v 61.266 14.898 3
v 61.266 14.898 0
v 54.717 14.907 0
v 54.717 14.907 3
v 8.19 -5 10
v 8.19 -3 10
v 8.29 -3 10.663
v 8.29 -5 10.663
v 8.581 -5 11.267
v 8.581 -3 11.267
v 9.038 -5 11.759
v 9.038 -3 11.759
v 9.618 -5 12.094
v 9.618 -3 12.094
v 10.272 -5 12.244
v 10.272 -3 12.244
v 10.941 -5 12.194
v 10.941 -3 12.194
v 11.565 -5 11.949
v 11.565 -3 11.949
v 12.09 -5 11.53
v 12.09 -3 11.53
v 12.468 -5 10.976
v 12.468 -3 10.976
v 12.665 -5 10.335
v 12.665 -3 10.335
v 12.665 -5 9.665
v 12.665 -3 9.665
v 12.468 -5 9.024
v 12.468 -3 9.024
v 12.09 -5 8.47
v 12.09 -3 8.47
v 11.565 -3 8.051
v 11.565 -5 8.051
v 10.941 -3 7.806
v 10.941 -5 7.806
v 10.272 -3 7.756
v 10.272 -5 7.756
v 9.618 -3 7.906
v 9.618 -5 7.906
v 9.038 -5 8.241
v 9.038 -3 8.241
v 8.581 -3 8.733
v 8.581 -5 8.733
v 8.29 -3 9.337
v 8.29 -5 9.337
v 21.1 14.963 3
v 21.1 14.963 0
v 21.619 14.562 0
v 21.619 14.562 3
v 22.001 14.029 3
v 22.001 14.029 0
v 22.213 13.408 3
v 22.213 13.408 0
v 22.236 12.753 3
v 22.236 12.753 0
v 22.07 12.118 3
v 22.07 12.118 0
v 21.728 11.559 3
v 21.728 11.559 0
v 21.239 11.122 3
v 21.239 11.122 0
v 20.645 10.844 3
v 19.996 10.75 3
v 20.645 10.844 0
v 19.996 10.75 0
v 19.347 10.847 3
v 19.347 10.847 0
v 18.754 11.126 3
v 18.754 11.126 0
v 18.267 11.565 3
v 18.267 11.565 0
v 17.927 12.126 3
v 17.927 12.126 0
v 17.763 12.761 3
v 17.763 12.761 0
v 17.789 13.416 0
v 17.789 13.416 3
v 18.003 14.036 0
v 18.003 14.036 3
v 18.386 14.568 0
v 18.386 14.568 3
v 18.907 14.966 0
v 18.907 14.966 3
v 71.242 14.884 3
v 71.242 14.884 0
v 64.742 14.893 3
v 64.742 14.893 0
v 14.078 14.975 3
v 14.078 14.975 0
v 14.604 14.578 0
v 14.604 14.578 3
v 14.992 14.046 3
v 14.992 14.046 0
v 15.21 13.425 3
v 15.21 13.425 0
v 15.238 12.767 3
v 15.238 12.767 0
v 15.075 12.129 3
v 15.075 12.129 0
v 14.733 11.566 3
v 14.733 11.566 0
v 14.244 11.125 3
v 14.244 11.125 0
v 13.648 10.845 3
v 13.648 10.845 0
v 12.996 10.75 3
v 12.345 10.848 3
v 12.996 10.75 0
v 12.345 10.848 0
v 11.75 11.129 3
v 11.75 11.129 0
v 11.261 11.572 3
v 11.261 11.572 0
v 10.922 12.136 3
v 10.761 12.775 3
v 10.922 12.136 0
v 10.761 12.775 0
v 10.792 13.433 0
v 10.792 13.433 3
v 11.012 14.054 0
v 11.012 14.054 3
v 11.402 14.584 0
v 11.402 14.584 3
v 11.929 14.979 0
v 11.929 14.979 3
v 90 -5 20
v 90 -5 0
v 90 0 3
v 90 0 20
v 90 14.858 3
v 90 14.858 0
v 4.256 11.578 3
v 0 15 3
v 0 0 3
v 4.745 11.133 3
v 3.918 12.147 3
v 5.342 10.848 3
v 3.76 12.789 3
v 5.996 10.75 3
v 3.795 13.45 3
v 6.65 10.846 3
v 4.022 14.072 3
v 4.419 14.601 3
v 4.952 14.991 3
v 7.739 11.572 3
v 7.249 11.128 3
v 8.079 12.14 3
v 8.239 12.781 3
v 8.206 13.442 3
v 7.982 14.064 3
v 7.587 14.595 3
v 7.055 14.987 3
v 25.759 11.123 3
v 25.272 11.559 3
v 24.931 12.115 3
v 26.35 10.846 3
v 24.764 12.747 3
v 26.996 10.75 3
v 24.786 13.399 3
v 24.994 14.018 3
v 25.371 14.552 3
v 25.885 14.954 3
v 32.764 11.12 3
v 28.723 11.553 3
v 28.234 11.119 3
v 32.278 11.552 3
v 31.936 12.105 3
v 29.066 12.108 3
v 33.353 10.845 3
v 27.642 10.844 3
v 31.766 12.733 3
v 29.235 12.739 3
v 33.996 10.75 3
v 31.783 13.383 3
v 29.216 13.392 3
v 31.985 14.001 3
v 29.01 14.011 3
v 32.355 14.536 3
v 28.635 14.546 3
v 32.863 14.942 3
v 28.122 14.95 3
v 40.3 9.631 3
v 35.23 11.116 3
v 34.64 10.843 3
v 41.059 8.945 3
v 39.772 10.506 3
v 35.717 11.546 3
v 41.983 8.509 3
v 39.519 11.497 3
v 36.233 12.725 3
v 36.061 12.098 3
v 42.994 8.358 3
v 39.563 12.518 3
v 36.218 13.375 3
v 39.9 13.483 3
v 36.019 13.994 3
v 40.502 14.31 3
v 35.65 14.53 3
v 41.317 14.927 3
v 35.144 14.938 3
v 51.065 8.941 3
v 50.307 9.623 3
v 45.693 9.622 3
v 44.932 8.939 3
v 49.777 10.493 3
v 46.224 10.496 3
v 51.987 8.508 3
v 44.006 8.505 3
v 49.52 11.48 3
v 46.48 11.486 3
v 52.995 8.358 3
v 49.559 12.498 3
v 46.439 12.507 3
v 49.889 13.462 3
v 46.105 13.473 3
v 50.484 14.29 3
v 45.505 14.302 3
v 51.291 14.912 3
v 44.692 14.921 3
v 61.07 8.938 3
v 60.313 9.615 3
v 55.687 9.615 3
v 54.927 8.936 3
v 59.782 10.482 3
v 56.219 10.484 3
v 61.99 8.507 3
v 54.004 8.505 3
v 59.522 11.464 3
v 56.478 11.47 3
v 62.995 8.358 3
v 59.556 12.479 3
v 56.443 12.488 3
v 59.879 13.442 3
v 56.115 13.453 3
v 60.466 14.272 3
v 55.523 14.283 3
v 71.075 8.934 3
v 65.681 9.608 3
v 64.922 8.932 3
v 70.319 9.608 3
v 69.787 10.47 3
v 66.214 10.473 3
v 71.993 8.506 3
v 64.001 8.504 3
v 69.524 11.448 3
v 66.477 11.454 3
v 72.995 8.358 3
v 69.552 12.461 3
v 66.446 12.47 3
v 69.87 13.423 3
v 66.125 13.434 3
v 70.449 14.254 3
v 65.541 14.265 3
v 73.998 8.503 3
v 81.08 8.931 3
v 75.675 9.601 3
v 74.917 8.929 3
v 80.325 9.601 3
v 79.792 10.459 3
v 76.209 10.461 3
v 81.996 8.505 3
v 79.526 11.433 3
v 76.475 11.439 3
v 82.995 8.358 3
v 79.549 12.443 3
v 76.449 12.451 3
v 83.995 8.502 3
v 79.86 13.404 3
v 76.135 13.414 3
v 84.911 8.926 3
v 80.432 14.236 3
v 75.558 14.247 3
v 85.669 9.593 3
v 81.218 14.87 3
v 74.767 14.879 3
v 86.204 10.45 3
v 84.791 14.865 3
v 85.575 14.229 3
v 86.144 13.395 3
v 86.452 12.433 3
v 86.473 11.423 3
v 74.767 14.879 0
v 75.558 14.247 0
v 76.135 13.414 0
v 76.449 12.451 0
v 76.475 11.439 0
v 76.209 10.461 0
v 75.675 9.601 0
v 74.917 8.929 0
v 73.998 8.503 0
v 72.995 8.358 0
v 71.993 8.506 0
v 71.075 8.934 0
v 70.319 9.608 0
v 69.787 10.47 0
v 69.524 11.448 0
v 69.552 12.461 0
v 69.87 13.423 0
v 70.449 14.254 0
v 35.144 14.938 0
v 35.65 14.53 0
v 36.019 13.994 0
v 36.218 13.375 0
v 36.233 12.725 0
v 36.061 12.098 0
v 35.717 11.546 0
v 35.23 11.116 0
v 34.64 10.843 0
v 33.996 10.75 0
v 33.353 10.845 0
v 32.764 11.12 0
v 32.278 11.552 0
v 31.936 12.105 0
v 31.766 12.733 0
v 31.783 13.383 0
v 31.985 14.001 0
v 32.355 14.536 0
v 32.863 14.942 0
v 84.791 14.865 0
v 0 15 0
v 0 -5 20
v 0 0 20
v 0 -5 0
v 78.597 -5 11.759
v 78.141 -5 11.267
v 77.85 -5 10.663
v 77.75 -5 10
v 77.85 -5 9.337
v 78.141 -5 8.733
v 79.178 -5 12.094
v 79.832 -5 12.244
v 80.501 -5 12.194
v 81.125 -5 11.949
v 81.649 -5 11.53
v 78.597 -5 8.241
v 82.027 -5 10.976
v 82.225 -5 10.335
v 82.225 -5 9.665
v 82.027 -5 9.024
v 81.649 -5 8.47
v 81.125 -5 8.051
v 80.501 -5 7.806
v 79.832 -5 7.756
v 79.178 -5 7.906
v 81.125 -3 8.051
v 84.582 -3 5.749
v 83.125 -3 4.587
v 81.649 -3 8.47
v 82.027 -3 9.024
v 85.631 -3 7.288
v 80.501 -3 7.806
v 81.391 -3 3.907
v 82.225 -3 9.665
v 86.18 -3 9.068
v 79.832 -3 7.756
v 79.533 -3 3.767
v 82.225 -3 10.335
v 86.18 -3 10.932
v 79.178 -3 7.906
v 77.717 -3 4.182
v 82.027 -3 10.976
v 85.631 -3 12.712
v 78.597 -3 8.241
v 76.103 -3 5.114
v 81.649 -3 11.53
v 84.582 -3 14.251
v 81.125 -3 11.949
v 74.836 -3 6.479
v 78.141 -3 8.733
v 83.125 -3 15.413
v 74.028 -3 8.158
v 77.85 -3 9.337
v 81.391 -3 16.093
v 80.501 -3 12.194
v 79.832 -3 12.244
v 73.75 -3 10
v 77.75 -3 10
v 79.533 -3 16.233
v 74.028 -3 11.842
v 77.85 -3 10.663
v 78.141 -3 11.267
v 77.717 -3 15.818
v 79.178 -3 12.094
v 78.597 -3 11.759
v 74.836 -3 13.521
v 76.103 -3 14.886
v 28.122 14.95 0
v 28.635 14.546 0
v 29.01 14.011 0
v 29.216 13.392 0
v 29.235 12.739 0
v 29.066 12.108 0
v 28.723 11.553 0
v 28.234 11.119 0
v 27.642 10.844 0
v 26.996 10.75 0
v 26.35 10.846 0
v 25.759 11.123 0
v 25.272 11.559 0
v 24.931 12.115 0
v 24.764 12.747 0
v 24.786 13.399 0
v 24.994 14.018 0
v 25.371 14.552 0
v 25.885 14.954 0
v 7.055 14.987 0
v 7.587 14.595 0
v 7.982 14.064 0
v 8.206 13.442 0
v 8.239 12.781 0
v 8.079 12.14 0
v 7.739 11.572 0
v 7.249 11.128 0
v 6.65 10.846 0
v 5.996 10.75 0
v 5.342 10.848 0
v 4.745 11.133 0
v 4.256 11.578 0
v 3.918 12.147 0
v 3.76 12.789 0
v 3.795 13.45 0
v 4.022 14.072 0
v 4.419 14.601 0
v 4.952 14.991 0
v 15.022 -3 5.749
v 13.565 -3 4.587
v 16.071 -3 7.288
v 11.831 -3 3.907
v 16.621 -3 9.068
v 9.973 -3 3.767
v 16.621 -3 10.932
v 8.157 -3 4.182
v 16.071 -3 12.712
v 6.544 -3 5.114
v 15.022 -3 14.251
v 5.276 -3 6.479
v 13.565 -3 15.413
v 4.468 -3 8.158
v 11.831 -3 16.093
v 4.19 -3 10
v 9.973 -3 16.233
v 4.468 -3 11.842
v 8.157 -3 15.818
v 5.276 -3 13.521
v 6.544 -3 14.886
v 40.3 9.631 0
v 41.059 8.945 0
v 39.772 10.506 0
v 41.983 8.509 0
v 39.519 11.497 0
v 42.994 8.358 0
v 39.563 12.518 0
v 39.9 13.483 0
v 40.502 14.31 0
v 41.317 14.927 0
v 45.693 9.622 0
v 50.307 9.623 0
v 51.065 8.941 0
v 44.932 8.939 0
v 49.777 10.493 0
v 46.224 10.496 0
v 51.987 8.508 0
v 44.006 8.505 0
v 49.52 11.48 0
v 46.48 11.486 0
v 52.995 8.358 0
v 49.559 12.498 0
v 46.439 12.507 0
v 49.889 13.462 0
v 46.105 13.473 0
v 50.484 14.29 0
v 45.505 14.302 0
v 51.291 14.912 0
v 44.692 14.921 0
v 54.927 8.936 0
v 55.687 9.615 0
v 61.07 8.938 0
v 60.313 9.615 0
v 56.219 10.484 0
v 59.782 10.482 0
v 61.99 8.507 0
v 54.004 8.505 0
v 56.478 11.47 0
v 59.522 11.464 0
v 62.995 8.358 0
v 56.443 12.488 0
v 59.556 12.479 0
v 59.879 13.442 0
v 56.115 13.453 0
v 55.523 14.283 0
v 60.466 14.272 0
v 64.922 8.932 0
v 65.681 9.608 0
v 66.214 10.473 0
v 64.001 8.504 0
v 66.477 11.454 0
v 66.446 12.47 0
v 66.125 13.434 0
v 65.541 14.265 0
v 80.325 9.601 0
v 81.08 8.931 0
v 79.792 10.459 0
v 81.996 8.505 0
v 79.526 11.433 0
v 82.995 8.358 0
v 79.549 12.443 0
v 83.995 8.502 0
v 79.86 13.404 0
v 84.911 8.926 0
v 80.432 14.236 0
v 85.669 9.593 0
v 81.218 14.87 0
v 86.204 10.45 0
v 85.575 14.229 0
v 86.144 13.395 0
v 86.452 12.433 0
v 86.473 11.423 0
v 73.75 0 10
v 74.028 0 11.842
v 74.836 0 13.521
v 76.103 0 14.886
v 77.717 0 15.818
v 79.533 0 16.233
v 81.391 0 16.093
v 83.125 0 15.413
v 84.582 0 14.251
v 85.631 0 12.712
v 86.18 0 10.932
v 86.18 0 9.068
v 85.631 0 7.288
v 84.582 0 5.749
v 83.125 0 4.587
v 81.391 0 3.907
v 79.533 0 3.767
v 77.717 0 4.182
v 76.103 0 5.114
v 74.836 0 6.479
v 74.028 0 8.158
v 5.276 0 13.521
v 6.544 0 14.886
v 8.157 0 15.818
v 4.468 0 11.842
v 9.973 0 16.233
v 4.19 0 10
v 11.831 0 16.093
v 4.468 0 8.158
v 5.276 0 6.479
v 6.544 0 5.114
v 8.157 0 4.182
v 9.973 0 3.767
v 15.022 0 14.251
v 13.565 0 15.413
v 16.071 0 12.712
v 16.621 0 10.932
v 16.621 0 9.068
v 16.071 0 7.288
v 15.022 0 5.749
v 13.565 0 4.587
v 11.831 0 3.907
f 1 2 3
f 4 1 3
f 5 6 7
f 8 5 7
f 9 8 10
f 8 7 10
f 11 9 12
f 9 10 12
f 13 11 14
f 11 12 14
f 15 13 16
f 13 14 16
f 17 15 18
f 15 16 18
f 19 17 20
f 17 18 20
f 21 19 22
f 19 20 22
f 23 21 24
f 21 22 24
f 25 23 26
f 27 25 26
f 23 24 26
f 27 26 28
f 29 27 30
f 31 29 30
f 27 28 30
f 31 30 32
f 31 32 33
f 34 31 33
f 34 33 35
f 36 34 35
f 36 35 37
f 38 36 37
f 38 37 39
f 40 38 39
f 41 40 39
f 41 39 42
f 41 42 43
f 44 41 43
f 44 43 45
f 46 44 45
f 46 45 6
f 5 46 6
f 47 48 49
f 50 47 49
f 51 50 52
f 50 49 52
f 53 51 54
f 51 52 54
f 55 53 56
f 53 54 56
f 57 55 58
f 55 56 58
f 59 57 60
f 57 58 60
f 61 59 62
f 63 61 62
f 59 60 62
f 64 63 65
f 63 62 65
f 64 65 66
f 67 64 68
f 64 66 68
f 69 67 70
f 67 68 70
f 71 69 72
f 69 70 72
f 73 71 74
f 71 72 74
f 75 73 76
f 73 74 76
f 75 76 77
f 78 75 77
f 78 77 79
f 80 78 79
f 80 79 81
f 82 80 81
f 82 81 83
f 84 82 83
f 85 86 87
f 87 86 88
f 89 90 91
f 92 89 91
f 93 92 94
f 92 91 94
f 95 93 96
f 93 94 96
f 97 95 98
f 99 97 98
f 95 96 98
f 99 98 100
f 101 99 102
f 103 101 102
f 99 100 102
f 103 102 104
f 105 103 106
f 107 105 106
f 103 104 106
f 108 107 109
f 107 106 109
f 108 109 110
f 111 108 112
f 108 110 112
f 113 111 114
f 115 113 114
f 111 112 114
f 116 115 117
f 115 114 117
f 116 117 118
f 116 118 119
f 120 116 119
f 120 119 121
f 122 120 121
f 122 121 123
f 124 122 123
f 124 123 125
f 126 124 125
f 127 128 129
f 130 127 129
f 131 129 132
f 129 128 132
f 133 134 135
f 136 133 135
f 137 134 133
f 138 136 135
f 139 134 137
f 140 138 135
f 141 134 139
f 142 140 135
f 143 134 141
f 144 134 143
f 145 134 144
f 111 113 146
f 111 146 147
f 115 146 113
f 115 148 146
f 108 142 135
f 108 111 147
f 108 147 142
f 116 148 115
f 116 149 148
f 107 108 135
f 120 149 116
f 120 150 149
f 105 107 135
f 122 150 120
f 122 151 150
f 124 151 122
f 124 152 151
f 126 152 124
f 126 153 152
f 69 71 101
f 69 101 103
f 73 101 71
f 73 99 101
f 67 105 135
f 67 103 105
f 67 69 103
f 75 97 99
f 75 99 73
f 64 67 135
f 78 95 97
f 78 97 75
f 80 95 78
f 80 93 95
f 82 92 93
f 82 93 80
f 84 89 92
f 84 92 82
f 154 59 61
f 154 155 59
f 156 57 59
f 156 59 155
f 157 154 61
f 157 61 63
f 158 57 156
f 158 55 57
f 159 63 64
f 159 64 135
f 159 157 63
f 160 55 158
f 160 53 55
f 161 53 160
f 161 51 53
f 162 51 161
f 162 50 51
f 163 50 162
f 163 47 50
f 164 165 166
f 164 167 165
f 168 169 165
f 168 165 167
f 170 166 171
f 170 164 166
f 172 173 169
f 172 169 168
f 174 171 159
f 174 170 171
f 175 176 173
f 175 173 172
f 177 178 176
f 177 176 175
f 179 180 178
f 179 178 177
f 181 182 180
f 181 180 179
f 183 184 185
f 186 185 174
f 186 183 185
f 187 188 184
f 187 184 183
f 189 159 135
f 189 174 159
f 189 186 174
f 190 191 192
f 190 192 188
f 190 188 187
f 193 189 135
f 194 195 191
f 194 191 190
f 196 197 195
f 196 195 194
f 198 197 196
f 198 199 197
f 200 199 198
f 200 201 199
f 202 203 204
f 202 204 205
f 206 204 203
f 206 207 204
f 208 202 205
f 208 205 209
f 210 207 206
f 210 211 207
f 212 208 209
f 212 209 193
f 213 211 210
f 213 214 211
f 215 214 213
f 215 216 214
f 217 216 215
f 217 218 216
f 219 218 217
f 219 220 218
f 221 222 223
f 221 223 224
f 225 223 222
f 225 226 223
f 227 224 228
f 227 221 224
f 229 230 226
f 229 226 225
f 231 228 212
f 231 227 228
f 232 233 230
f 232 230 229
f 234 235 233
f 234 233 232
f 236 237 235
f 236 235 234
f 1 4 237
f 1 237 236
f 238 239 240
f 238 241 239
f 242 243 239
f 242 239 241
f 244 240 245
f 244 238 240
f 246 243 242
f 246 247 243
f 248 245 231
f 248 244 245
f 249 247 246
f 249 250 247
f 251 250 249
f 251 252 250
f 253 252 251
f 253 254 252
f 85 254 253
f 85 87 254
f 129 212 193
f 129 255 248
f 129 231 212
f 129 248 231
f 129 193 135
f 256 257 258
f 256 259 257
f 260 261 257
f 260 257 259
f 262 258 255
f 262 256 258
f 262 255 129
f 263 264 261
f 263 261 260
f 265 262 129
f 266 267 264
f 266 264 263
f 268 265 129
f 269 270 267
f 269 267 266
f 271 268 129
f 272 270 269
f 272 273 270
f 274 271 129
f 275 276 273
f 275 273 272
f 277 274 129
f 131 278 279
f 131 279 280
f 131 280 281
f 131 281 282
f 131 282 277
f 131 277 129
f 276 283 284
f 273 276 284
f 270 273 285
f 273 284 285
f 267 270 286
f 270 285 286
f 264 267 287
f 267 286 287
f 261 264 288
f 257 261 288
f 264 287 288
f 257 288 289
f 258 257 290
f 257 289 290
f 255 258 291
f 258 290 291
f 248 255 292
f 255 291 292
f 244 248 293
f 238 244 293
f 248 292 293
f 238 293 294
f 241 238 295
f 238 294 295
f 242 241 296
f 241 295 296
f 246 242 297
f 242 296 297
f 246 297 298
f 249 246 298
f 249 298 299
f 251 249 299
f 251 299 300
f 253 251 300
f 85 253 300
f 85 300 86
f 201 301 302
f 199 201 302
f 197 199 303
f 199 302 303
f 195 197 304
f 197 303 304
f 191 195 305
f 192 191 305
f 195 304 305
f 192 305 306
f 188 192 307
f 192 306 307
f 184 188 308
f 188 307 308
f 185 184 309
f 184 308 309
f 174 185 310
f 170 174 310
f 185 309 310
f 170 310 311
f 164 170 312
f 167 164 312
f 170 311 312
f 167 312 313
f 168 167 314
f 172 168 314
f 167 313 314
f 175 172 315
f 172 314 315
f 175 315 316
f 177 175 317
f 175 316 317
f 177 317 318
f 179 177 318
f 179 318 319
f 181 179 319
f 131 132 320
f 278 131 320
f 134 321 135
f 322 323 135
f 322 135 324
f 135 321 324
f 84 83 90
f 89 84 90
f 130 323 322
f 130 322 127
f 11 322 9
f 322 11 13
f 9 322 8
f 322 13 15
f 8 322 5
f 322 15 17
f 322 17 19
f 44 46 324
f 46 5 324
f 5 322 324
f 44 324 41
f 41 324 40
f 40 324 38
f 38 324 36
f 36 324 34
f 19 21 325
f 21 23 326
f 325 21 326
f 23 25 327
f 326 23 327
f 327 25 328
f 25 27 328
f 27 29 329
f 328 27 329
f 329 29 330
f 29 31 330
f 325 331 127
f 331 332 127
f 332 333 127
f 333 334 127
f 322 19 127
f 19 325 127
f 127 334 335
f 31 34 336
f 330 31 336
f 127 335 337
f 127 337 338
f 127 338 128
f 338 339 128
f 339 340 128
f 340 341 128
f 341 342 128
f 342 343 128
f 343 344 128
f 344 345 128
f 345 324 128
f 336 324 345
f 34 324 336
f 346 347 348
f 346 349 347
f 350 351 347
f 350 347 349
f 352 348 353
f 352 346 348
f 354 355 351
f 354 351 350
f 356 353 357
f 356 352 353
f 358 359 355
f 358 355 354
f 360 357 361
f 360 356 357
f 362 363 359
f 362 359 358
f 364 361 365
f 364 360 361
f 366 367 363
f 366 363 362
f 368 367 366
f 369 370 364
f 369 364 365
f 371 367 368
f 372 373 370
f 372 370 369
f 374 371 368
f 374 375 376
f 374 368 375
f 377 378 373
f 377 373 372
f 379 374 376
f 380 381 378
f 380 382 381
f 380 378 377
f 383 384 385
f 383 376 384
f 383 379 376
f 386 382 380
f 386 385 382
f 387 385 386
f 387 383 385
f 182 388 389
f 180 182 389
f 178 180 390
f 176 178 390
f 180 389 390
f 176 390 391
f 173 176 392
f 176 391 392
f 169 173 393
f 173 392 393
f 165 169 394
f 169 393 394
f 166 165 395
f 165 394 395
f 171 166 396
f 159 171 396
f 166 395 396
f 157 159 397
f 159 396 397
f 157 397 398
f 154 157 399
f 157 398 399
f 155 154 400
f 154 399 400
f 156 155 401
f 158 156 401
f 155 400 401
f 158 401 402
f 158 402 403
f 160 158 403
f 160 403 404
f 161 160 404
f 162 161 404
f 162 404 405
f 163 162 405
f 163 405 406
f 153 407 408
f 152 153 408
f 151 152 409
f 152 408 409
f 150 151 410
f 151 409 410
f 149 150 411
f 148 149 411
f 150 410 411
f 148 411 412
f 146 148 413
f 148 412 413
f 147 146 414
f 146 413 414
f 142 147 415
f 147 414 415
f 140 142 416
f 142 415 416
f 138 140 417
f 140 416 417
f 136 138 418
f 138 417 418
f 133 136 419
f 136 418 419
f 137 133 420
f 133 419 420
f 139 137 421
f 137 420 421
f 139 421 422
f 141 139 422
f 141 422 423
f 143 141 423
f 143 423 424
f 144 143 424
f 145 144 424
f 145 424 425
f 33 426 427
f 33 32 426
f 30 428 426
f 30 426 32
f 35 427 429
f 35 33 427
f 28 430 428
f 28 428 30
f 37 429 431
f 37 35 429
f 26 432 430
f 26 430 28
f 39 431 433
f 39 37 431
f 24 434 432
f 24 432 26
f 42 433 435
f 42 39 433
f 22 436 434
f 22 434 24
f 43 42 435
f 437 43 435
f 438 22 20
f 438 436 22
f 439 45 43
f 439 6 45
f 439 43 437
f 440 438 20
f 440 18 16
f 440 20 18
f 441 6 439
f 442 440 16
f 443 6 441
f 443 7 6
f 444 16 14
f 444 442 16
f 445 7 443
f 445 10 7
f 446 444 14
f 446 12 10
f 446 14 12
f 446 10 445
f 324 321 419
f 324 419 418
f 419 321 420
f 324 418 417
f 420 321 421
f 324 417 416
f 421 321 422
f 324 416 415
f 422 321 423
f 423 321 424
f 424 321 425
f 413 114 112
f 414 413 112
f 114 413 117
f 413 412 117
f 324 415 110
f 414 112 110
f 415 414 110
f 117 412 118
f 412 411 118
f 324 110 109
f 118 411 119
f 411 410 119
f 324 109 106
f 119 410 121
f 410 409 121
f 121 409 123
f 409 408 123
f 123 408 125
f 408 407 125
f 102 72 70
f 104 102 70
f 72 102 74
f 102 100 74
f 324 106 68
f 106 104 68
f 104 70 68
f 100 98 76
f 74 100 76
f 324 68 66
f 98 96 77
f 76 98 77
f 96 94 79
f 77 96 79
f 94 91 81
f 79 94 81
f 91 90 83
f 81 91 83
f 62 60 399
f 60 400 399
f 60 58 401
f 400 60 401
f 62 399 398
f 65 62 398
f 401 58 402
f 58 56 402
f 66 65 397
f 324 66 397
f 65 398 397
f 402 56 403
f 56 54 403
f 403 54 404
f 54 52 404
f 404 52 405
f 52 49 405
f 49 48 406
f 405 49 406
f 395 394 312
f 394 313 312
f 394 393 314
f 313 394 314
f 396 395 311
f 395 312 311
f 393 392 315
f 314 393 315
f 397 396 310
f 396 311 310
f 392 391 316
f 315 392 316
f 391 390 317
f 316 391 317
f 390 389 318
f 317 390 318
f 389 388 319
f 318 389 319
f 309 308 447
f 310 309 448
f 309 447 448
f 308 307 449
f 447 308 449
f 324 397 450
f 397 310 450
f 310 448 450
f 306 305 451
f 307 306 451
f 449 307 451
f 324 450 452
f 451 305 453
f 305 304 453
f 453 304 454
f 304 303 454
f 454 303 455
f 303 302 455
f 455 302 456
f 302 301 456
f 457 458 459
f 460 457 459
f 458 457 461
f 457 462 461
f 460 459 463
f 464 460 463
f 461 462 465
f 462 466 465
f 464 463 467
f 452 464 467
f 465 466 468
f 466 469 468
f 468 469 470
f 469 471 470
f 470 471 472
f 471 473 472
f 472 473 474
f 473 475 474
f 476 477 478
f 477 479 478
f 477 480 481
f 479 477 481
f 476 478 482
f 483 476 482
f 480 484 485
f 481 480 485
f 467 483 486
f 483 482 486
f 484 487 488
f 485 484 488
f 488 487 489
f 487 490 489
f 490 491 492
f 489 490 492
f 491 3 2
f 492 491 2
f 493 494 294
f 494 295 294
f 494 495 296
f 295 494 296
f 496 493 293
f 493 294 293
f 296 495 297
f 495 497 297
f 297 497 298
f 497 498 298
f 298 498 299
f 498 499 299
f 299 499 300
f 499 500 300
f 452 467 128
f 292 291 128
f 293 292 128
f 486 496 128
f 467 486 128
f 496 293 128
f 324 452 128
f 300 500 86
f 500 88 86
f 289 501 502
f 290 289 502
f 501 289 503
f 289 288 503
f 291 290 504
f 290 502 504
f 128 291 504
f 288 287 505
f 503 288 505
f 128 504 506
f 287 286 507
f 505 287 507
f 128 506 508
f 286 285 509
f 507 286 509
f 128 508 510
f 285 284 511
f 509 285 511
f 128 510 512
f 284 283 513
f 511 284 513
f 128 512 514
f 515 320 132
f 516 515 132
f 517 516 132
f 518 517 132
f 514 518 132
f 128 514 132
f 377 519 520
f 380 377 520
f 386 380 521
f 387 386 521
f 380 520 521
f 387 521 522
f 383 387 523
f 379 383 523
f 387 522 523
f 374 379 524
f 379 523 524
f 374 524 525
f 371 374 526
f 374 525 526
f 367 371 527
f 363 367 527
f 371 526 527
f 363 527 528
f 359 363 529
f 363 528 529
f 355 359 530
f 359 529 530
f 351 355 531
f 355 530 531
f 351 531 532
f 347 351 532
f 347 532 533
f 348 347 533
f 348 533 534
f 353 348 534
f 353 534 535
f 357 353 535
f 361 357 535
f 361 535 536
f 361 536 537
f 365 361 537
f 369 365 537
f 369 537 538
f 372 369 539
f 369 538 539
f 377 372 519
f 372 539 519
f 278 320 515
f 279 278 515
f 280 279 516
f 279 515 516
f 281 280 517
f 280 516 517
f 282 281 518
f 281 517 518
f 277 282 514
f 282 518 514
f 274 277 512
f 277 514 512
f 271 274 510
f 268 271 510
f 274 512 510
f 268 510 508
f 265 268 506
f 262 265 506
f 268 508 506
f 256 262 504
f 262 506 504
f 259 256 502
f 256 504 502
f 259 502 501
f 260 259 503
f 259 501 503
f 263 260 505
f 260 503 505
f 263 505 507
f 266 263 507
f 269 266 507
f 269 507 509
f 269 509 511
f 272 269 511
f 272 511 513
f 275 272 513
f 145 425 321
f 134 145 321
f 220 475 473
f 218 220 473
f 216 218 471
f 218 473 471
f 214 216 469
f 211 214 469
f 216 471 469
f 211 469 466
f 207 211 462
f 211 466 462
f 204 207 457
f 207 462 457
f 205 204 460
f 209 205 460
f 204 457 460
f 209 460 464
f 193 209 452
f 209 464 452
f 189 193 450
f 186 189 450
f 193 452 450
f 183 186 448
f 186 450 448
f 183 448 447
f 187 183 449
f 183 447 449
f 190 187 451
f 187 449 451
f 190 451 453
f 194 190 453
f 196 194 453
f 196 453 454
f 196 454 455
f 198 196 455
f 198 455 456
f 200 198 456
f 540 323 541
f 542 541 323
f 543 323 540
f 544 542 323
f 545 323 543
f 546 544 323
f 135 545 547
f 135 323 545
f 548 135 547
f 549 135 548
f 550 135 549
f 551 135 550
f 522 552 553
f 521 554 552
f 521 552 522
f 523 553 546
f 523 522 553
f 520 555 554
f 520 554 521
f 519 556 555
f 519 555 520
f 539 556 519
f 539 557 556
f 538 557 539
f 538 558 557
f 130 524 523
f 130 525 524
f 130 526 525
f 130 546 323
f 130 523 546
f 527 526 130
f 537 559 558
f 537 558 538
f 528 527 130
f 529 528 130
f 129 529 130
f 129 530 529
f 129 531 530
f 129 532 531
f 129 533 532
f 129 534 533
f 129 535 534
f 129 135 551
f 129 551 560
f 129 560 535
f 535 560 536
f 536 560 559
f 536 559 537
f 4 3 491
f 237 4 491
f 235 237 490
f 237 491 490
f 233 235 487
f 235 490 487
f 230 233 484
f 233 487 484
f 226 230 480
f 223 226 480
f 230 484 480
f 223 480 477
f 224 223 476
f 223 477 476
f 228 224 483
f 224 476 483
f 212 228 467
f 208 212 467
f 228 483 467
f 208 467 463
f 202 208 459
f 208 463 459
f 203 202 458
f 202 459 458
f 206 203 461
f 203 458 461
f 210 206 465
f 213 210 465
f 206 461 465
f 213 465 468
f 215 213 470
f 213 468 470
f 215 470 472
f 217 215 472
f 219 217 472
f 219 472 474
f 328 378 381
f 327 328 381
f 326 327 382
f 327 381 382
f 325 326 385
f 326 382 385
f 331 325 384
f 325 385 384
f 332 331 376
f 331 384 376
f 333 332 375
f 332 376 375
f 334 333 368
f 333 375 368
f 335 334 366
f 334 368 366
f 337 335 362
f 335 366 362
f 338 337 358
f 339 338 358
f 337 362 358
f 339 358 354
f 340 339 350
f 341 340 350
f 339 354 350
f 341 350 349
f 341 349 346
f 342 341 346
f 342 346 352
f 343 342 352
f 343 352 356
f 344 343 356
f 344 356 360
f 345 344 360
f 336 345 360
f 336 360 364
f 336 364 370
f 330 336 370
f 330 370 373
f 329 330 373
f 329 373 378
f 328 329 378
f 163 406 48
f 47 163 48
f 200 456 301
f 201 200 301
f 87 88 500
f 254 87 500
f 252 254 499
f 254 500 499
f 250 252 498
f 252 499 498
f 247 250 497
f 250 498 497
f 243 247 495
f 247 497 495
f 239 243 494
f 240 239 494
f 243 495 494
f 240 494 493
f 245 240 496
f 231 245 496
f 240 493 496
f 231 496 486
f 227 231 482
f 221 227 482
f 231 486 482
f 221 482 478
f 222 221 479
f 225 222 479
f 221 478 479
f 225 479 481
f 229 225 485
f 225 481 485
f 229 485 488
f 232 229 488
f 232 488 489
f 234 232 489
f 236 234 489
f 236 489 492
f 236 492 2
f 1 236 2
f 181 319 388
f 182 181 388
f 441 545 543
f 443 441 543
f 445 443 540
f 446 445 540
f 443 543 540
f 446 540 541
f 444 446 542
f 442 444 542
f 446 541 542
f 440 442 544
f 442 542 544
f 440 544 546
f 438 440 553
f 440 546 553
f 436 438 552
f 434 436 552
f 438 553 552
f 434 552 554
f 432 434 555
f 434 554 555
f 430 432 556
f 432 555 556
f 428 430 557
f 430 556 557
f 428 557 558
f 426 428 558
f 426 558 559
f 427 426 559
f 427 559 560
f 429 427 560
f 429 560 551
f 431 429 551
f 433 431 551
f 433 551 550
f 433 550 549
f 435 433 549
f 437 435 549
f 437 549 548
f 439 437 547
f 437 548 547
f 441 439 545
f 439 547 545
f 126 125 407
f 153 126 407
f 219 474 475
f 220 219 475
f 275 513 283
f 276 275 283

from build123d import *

# Parameters (mm, degrees)
F0_W     = 90
F0_H     = 5
F1_DEPTH = 20
F2_R     = 6.25
F2_R_2   = 2.25
F3_DEPTH = 3
F4_DEPTH = 25
F5_DEPTH = 3


with BuildPart() as f1:
    # F0 (on Top) → F1 (new body)
    with BuildSketch(Plane.XY):
        with Locations((45, -2.5)):
            Rectangle(F0_W, F0_H)
    extrude(amount=F1_DEPTH)

    # F2 (on face) → F3 (cut)
    with BuildSketch(Plane(origin=(0, 0, 0), x_dir=(-1, 0, 0), z_dir=(0, 1, 0))):
        with Locations((-10.4403868318, 10)):
            Circle(F2_R)
        with Locations((-10.4403868318, 10)):
            Circle(F2_R_2, mode=Mode.SUBTRACT)
        with Locations((-80, 10)):
            Circle(F2_R)
        with Locations((-80, 10)):
            Circle(F2_R_2, mode=Mode.SUBTRACT)
    extrude(amount=-F3_DEPTH, mode=Mode.SUBTRACT)

    # F4 (cut): faces of the model
    f4_faces = [f1.faces().sort_by_distance(p)[0] for p in [
        (80, 0, 10),
        (10.4403868318, 0, 10),
    ]]
    extrude(f4_faces, amount=-F4_DEPTH, mode=Mode.SUBTRACT)

    # F0 (on Top) → F5 (join)
    with BuildSketch(Plane.XY):
        with BuildLine():
            Line((0, 13), (0, 0))
            Line((0, 0), (90, 0))
            Line((90, 0), (90, 11.8577008211))
            Line((90, 11.8577008211), (90, 14.8577008211))
            Line((90, 14.8577008211), (84.7905250274, 14.8650285595))
            ThreePointArc((84.7905250274, 14.8650285595), (82.9950768438, 8.3577042836), (81.2179423605, 14.8700538166))
            Line((81.2179423605, 14.8700538166), (74.7666283432, 14.8791283475))
            ThreePointArc((74.7666283432, 14.8791283475), (72.9950768438, 8.3577042836), (71.2418786162, 14.8840863219))
            Line((71.2418786162, 14.8840863219), (64.7422887653, 14.8932287584))
            ThreePointArc((64.7422887653, 14.8932287584), (62.9950768438, 8.3577042836), (61.2662577654, 14.8981182043))
            Line((61.2662577654, 14.8981182043), (54.7174874018, 14.9073298189))
            ThreePointArc((54.7174874018, 14.9073298189), (52.9950768438, 8.3577042836), (51.2910987002, 14.9121494371))
            Line((51.2910987002, 14.9121494371), (44.6922038807, 14.9214315577))
            ThreePointArc((44.6922038807, 14.9214315577), (42.99446615, 8.3577051959), (41.3174926972, 14.9267673202))
            Line((41.3174926972, 14.9267673202), (35.1435817461, 14.9377101925))
            ThreePointArc((35.1435817461, 14.9377101925), (33.9960120215, 10.7500035342), (32.8632943585, 14.9417518597))
            Line((32.8632943585, 14.9417518597), (28.1222277254, 14.9501551047))
            ThreePointArc((28.1222277254, 14.9501551047), (26.9960120215, 10.7500035342), (25.8846923606, 14.9541209966))
            Line((25.8846923606, 14.9541209966), (21.1003169088, 14.9626010038))
            ThreePointArc((21.1003169088, 14.9626010038), (19.9960120215, 10.7500035342), (18.9066471585, 14.9664891467))
            Line((18.9066471585, 14.9664891467), (14.0778151948, 14.9750479503))
            ThreePointArc((14.0778151948, 14.9750479503), (12.9960120215, 10.7500035342), (11.9291928539, 14.9788562494))
            Line((11.9291928539, 14.9788562494), (7.0546845996, 14.9874960114))
            ThreePointArc((7.0546845996, 14.9874960114), (5.9960120215, 10.7500035342), (4.9523674304, 14.9912222375))
            Line((4.9523674304, 14.9912222375), (0, 15))
            Line((0, 15), (0, 13))
        make_face()
    extrude(amount=F5_DEPTH)


solid = f1.part
